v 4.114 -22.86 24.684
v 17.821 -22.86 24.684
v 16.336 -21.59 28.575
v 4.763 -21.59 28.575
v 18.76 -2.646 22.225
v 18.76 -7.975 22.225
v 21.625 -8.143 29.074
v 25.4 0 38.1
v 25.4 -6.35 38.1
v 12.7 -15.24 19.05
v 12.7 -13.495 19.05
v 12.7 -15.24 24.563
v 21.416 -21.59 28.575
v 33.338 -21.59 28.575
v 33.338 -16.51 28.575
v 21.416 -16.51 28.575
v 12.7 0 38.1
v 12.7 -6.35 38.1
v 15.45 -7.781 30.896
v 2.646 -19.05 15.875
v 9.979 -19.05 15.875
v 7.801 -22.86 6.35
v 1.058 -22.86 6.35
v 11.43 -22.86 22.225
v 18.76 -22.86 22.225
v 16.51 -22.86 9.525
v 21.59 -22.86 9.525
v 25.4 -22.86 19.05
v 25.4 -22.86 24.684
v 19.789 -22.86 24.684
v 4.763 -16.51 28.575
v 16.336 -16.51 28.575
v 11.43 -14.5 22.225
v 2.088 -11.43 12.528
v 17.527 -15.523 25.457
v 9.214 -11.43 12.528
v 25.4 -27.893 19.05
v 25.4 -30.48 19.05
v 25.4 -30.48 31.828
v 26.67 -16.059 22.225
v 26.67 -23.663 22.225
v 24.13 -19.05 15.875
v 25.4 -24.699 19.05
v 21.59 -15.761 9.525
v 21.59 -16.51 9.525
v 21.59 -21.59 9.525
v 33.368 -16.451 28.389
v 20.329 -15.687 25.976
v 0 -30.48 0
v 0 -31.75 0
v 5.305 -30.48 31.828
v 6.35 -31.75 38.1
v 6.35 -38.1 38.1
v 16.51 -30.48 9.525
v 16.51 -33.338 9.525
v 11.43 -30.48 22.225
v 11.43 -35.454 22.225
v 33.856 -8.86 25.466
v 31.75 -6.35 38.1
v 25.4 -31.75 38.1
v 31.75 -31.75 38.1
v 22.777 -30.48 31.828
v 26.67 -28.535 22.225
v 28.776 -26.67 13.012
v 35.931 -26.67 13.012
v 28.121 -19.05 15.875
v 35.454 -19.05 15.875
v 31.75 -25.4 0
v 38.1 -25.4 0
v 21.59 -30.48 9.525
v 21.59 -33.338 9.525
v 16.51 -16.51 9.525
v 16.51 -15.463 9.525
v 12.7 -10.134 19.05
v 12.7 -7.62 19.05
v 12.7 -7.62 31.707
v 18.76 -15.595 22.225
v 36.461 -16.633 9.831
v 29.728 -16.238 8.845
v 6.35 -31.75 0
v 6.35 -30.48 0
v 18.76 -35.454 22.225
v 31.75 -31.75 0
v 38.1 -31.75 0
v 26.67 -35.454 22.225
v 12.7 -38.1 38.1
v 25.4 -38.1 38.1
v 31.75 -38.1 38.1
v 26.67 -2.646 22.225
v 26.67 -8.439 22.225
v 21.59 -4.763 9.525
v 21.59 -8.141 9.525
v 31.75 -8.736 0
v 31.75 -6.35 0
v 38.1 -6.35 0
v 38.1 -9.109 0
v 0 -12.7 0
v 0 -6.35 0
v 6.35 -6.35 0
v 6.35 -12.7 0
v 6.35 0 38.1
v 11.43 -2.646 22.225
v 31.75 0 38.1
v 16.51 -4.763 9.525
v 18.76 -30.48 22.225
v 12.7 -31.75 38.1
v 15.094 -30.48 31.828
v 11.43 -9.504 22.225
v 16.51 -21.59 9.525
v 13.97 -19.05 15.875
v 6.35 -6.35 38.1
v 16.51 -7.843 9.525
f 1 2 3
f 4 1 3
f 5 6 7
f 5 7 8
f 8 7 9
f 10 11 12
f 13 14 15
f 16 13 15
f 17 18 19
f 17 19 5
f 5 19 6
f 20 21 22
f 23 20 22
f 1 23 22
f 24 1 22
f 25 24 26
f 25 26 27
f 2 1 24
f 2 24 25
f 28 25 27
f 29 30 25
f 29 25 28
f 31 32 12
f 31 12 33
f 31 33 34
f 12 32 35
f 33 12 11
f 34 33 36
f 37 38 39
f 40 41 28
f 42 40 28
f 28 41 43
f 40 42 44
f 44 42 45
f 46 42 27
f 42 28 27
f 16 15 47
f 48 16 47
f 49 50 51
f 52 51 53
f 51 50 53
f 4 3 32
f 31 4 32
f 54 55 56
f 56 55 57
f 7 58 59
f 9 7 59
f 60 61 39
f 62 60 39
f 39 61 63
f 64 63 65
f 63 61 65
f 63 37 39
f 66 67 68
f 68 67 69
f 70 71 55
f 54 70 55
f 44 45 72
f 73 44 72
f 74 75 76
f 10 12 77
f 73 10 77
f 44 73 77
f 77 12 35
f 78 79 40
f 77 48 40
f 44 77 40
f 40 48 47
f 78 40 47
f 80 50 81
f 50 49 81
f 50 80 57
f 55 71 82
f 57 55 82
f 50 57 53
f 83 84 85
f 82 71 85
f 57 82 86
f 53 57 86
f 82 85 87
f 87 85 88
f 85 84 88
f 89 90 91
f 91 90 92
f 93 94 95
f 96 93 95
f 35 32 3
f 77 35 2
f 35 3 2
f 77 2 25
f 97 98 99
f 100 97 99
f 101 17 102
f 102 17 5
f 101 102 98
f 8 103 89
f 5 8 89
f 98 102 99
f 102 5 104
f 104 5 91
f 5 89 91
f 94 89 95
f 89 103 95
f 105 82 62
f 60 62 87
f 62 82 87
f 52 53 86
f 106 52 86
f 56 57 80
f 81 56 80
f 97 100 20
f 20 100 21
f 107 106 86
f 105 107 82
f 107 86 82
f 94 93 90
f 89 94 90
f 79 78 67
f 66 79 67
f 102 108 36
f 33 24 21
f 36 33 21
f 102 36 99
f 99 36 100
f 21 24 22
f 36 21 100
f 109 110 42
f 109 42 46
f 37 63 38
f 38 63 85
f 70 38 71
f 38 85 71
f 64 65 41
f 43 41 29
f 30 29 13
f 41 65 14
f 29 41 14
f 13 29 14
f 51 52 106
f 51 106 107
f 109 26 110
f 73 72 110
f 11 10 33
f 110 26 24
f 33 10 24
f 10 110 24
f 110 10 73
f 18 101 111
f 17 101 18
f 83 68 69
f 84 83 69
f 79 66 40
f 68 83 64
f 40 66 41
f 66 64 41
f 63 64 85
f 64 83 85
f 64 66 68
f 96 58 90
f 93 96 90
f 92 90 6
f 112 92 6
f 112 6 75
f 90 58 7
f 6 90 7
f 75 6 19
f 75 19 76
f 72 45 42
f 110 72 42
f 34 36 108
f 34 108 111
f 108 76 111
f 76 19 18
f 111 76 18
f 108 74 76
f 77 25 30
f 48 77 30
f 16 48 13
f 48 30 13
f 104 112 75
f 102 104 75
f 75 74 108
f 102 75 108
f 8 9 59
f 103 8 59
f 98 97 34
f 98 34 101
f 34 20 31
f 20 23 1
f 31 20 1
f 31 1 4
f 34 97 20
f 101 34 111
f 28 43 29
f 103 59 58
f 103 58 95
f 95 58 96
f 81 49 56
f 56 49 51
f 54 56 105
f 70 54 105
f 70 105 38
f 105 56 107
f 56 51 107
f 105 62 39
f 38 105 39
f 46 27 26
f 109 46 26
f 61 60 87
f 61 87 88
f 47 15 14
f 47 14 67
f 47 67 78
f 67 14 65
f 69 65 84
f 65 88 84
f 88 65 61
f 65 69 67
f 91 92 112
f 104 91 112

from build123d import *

# Parameters (mm, degrees)
F0_W      = 38.1
F0_H      = 38.1
F1_DEPTH  = 38.1
F6_DEPTH  = 76.2
F8_DEPTH  = 76.2
F9_W      = 25.4
F9_H      = 7.62
F10_DEPTH = 76.2


with BuildPart() as f1:
    # F0 (on Front) → F1 (new body)
    with BuildSketch(Plane.XZ):
        with Locations((19.05, 19.05)):
            Rectangle(F0_W, F0_H)
    extrude(amount=F1_DEPTH)

    # F5 (on offset) → F6 (cut)
    with BuildSketch(Plane.YZ.offset(76.2)):
        Polygon((-11.43, 12.5278225169), (-6.35, 38.1), (-31.75, 38.1), (-26.67, 13.0124986172), (-21.59, 28.575), (-16.51, 28.575), align=None)
        Polygon((-25.4, 0), (-12.7, 0), (-19.05, 15.875), align=None)
        Polygon((-38.1, 0), (-31.75, 0), (-38.1, 38.1), align=None)
        Polygon((-6.35, 0), (0, 0), (0, 38.1), align=None)
    extrude(amount=-F6_DEPTH, mode=Mode.SUBTRACT)

    # F7 (on offset) → F8 (cut)
    with BuildSketch(Plane.XZ.offset(76.2)):
        Polygon((25.4, 38.1), (12.7, 38.1), (18.7603693128, 22.225), align=None)
        Polygon((6.35, 38.1), (0, 38.1), (0, 0), align=None)
        Polygon((11.43, 22.225), (6.35, 0), (31.75, 0), (26.67, 22.225), (21.59, 9.525), (16.51, 9.525), align=None)
        Polygon((38.1, 38.1), (31.75, 38.1), (38.1, 0), align=None)
    extrude(amount=-F8_DEPTH, mode=Mode.SUBTRACT)

    # F9 (on offset) → F10 (cut)
    with BuildSketch(Plane.XY.offset(76.2)):
        Polygon((38.1, -16.7285427451), (38.1, -9.1085427451), (12.7, -7.62), (12.7, -15.24), align=None)
        with Locations((12.7, -26.67)):
            Rectangle(F9_W, F9_H)
    extrude(amount=-F10_DEPTH, mode=Mode.SUBTRACT)


solid = f1.part
